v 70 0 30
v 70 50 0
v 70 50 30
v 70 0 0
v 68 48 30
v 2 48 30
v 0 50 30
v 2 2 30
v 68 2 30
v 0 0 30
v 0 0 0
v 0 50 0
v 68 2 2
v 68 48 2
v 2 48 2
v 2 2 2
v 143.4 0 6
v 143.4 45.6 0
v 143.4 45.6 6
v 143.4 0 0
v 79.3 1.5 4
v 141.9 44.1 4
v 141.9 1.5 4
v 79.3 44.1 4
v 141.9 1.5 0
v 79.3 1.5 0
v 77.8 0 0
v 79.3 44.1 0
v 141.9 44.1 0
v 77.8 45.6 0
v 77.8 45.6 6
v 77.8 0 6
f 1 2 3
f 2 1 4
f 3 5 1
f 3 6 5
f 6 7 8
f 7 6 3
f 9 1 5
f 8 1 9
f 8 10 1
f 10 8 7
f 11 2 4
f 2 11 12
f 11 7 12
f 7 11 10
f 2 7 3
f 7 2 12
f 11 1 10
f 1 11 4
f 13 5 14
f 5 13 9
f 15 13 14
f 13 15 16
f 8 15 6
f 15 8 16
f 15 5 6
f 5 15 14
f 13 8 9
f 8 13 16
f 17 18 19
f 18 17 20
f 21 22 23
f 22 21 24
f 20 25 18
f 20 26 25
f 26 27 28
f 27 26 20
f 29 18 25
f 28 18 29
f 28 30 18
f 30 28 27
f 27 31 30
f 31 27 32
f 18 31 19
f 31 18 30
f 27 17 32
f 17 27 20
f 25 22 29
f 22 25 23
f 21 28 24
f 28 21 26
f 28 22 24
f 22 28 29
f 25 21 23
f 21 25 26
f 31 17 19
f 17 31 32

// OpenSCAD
// --- Dimensions ---
// Outer box width (X)
box_w = 70;
// Outer box depth (Y)
box_d = 50;
// Outer box height (Z)
box_h = 30;
// Wall thickness
wall = 2;
// Floor thickness
floor = 2;
// Lid plate thickness
lid_thick = 2;
// Lip wall thickness
lip_wall = 1.5;
// Lip height
lip_h = 4;
// Lip outer width (X)
lip_w = 65.6;
// Lip outer depth (Y)
lip_d = 45.6;
// Gap between parts on bed
gap = 10;

// Derived dimensions
// Inner box width
box_iw = box_w - 2 * wall;
// Inner box depth
box_id = box_d - 2 * wall;
// Inner box height (usable)
box_ih = box_h - floor;

// Lip inner width (for clearance)
lip_iw = lip_w - 2 * lip_wall;
// Lip inner depth (for clearance)
lip_id = lip_d - 2 * lip_wall;

// Position offsets to place parts side by side
// Box centered at origin in X, lid to the right
box_x = 0;
box_y = 0;
// Lid position: right edge of box + gap + half of lid width
lid_x = (box_w / 2) + gap + (lip_w / 2);
lid_y = 0;

// --- Part 1: Box ---
translate([box_x, box_y, 0]) {
    difference() {
        // Outer solid block
        cube([box_w, box_d, box_h], center = false);
        
        // Inner cavity (starts at floor height, extends up)
        translate([wall, wall, floor])
            cube([box_iw, box_id, box_h - floor + 0.01], center = false);
    }
}

// --- Part 2: Lid (printed upside down) ---
// When printed upside down, the lip is on the bed and the plate is on top
translate([lid_x, lid_y, 0]) {
    // Lip walls (on the bed)
    difference() {
        // Full lip block
        cube([lip_w, lip_d, lip_h], center = false);
        
        // Hollow center
        translate([(lip_w - lip_iw) / 2, (lip_d - lip_id) / 2, 0])
            cube([lip_iw, lip_id, lip_h + 0.01], center = false);
    }
    
    // Plate (on top of lip)
    translate([0, 0, lip_h])
        cube([lip_w, lip_d, lid_thick], center = false);
}
